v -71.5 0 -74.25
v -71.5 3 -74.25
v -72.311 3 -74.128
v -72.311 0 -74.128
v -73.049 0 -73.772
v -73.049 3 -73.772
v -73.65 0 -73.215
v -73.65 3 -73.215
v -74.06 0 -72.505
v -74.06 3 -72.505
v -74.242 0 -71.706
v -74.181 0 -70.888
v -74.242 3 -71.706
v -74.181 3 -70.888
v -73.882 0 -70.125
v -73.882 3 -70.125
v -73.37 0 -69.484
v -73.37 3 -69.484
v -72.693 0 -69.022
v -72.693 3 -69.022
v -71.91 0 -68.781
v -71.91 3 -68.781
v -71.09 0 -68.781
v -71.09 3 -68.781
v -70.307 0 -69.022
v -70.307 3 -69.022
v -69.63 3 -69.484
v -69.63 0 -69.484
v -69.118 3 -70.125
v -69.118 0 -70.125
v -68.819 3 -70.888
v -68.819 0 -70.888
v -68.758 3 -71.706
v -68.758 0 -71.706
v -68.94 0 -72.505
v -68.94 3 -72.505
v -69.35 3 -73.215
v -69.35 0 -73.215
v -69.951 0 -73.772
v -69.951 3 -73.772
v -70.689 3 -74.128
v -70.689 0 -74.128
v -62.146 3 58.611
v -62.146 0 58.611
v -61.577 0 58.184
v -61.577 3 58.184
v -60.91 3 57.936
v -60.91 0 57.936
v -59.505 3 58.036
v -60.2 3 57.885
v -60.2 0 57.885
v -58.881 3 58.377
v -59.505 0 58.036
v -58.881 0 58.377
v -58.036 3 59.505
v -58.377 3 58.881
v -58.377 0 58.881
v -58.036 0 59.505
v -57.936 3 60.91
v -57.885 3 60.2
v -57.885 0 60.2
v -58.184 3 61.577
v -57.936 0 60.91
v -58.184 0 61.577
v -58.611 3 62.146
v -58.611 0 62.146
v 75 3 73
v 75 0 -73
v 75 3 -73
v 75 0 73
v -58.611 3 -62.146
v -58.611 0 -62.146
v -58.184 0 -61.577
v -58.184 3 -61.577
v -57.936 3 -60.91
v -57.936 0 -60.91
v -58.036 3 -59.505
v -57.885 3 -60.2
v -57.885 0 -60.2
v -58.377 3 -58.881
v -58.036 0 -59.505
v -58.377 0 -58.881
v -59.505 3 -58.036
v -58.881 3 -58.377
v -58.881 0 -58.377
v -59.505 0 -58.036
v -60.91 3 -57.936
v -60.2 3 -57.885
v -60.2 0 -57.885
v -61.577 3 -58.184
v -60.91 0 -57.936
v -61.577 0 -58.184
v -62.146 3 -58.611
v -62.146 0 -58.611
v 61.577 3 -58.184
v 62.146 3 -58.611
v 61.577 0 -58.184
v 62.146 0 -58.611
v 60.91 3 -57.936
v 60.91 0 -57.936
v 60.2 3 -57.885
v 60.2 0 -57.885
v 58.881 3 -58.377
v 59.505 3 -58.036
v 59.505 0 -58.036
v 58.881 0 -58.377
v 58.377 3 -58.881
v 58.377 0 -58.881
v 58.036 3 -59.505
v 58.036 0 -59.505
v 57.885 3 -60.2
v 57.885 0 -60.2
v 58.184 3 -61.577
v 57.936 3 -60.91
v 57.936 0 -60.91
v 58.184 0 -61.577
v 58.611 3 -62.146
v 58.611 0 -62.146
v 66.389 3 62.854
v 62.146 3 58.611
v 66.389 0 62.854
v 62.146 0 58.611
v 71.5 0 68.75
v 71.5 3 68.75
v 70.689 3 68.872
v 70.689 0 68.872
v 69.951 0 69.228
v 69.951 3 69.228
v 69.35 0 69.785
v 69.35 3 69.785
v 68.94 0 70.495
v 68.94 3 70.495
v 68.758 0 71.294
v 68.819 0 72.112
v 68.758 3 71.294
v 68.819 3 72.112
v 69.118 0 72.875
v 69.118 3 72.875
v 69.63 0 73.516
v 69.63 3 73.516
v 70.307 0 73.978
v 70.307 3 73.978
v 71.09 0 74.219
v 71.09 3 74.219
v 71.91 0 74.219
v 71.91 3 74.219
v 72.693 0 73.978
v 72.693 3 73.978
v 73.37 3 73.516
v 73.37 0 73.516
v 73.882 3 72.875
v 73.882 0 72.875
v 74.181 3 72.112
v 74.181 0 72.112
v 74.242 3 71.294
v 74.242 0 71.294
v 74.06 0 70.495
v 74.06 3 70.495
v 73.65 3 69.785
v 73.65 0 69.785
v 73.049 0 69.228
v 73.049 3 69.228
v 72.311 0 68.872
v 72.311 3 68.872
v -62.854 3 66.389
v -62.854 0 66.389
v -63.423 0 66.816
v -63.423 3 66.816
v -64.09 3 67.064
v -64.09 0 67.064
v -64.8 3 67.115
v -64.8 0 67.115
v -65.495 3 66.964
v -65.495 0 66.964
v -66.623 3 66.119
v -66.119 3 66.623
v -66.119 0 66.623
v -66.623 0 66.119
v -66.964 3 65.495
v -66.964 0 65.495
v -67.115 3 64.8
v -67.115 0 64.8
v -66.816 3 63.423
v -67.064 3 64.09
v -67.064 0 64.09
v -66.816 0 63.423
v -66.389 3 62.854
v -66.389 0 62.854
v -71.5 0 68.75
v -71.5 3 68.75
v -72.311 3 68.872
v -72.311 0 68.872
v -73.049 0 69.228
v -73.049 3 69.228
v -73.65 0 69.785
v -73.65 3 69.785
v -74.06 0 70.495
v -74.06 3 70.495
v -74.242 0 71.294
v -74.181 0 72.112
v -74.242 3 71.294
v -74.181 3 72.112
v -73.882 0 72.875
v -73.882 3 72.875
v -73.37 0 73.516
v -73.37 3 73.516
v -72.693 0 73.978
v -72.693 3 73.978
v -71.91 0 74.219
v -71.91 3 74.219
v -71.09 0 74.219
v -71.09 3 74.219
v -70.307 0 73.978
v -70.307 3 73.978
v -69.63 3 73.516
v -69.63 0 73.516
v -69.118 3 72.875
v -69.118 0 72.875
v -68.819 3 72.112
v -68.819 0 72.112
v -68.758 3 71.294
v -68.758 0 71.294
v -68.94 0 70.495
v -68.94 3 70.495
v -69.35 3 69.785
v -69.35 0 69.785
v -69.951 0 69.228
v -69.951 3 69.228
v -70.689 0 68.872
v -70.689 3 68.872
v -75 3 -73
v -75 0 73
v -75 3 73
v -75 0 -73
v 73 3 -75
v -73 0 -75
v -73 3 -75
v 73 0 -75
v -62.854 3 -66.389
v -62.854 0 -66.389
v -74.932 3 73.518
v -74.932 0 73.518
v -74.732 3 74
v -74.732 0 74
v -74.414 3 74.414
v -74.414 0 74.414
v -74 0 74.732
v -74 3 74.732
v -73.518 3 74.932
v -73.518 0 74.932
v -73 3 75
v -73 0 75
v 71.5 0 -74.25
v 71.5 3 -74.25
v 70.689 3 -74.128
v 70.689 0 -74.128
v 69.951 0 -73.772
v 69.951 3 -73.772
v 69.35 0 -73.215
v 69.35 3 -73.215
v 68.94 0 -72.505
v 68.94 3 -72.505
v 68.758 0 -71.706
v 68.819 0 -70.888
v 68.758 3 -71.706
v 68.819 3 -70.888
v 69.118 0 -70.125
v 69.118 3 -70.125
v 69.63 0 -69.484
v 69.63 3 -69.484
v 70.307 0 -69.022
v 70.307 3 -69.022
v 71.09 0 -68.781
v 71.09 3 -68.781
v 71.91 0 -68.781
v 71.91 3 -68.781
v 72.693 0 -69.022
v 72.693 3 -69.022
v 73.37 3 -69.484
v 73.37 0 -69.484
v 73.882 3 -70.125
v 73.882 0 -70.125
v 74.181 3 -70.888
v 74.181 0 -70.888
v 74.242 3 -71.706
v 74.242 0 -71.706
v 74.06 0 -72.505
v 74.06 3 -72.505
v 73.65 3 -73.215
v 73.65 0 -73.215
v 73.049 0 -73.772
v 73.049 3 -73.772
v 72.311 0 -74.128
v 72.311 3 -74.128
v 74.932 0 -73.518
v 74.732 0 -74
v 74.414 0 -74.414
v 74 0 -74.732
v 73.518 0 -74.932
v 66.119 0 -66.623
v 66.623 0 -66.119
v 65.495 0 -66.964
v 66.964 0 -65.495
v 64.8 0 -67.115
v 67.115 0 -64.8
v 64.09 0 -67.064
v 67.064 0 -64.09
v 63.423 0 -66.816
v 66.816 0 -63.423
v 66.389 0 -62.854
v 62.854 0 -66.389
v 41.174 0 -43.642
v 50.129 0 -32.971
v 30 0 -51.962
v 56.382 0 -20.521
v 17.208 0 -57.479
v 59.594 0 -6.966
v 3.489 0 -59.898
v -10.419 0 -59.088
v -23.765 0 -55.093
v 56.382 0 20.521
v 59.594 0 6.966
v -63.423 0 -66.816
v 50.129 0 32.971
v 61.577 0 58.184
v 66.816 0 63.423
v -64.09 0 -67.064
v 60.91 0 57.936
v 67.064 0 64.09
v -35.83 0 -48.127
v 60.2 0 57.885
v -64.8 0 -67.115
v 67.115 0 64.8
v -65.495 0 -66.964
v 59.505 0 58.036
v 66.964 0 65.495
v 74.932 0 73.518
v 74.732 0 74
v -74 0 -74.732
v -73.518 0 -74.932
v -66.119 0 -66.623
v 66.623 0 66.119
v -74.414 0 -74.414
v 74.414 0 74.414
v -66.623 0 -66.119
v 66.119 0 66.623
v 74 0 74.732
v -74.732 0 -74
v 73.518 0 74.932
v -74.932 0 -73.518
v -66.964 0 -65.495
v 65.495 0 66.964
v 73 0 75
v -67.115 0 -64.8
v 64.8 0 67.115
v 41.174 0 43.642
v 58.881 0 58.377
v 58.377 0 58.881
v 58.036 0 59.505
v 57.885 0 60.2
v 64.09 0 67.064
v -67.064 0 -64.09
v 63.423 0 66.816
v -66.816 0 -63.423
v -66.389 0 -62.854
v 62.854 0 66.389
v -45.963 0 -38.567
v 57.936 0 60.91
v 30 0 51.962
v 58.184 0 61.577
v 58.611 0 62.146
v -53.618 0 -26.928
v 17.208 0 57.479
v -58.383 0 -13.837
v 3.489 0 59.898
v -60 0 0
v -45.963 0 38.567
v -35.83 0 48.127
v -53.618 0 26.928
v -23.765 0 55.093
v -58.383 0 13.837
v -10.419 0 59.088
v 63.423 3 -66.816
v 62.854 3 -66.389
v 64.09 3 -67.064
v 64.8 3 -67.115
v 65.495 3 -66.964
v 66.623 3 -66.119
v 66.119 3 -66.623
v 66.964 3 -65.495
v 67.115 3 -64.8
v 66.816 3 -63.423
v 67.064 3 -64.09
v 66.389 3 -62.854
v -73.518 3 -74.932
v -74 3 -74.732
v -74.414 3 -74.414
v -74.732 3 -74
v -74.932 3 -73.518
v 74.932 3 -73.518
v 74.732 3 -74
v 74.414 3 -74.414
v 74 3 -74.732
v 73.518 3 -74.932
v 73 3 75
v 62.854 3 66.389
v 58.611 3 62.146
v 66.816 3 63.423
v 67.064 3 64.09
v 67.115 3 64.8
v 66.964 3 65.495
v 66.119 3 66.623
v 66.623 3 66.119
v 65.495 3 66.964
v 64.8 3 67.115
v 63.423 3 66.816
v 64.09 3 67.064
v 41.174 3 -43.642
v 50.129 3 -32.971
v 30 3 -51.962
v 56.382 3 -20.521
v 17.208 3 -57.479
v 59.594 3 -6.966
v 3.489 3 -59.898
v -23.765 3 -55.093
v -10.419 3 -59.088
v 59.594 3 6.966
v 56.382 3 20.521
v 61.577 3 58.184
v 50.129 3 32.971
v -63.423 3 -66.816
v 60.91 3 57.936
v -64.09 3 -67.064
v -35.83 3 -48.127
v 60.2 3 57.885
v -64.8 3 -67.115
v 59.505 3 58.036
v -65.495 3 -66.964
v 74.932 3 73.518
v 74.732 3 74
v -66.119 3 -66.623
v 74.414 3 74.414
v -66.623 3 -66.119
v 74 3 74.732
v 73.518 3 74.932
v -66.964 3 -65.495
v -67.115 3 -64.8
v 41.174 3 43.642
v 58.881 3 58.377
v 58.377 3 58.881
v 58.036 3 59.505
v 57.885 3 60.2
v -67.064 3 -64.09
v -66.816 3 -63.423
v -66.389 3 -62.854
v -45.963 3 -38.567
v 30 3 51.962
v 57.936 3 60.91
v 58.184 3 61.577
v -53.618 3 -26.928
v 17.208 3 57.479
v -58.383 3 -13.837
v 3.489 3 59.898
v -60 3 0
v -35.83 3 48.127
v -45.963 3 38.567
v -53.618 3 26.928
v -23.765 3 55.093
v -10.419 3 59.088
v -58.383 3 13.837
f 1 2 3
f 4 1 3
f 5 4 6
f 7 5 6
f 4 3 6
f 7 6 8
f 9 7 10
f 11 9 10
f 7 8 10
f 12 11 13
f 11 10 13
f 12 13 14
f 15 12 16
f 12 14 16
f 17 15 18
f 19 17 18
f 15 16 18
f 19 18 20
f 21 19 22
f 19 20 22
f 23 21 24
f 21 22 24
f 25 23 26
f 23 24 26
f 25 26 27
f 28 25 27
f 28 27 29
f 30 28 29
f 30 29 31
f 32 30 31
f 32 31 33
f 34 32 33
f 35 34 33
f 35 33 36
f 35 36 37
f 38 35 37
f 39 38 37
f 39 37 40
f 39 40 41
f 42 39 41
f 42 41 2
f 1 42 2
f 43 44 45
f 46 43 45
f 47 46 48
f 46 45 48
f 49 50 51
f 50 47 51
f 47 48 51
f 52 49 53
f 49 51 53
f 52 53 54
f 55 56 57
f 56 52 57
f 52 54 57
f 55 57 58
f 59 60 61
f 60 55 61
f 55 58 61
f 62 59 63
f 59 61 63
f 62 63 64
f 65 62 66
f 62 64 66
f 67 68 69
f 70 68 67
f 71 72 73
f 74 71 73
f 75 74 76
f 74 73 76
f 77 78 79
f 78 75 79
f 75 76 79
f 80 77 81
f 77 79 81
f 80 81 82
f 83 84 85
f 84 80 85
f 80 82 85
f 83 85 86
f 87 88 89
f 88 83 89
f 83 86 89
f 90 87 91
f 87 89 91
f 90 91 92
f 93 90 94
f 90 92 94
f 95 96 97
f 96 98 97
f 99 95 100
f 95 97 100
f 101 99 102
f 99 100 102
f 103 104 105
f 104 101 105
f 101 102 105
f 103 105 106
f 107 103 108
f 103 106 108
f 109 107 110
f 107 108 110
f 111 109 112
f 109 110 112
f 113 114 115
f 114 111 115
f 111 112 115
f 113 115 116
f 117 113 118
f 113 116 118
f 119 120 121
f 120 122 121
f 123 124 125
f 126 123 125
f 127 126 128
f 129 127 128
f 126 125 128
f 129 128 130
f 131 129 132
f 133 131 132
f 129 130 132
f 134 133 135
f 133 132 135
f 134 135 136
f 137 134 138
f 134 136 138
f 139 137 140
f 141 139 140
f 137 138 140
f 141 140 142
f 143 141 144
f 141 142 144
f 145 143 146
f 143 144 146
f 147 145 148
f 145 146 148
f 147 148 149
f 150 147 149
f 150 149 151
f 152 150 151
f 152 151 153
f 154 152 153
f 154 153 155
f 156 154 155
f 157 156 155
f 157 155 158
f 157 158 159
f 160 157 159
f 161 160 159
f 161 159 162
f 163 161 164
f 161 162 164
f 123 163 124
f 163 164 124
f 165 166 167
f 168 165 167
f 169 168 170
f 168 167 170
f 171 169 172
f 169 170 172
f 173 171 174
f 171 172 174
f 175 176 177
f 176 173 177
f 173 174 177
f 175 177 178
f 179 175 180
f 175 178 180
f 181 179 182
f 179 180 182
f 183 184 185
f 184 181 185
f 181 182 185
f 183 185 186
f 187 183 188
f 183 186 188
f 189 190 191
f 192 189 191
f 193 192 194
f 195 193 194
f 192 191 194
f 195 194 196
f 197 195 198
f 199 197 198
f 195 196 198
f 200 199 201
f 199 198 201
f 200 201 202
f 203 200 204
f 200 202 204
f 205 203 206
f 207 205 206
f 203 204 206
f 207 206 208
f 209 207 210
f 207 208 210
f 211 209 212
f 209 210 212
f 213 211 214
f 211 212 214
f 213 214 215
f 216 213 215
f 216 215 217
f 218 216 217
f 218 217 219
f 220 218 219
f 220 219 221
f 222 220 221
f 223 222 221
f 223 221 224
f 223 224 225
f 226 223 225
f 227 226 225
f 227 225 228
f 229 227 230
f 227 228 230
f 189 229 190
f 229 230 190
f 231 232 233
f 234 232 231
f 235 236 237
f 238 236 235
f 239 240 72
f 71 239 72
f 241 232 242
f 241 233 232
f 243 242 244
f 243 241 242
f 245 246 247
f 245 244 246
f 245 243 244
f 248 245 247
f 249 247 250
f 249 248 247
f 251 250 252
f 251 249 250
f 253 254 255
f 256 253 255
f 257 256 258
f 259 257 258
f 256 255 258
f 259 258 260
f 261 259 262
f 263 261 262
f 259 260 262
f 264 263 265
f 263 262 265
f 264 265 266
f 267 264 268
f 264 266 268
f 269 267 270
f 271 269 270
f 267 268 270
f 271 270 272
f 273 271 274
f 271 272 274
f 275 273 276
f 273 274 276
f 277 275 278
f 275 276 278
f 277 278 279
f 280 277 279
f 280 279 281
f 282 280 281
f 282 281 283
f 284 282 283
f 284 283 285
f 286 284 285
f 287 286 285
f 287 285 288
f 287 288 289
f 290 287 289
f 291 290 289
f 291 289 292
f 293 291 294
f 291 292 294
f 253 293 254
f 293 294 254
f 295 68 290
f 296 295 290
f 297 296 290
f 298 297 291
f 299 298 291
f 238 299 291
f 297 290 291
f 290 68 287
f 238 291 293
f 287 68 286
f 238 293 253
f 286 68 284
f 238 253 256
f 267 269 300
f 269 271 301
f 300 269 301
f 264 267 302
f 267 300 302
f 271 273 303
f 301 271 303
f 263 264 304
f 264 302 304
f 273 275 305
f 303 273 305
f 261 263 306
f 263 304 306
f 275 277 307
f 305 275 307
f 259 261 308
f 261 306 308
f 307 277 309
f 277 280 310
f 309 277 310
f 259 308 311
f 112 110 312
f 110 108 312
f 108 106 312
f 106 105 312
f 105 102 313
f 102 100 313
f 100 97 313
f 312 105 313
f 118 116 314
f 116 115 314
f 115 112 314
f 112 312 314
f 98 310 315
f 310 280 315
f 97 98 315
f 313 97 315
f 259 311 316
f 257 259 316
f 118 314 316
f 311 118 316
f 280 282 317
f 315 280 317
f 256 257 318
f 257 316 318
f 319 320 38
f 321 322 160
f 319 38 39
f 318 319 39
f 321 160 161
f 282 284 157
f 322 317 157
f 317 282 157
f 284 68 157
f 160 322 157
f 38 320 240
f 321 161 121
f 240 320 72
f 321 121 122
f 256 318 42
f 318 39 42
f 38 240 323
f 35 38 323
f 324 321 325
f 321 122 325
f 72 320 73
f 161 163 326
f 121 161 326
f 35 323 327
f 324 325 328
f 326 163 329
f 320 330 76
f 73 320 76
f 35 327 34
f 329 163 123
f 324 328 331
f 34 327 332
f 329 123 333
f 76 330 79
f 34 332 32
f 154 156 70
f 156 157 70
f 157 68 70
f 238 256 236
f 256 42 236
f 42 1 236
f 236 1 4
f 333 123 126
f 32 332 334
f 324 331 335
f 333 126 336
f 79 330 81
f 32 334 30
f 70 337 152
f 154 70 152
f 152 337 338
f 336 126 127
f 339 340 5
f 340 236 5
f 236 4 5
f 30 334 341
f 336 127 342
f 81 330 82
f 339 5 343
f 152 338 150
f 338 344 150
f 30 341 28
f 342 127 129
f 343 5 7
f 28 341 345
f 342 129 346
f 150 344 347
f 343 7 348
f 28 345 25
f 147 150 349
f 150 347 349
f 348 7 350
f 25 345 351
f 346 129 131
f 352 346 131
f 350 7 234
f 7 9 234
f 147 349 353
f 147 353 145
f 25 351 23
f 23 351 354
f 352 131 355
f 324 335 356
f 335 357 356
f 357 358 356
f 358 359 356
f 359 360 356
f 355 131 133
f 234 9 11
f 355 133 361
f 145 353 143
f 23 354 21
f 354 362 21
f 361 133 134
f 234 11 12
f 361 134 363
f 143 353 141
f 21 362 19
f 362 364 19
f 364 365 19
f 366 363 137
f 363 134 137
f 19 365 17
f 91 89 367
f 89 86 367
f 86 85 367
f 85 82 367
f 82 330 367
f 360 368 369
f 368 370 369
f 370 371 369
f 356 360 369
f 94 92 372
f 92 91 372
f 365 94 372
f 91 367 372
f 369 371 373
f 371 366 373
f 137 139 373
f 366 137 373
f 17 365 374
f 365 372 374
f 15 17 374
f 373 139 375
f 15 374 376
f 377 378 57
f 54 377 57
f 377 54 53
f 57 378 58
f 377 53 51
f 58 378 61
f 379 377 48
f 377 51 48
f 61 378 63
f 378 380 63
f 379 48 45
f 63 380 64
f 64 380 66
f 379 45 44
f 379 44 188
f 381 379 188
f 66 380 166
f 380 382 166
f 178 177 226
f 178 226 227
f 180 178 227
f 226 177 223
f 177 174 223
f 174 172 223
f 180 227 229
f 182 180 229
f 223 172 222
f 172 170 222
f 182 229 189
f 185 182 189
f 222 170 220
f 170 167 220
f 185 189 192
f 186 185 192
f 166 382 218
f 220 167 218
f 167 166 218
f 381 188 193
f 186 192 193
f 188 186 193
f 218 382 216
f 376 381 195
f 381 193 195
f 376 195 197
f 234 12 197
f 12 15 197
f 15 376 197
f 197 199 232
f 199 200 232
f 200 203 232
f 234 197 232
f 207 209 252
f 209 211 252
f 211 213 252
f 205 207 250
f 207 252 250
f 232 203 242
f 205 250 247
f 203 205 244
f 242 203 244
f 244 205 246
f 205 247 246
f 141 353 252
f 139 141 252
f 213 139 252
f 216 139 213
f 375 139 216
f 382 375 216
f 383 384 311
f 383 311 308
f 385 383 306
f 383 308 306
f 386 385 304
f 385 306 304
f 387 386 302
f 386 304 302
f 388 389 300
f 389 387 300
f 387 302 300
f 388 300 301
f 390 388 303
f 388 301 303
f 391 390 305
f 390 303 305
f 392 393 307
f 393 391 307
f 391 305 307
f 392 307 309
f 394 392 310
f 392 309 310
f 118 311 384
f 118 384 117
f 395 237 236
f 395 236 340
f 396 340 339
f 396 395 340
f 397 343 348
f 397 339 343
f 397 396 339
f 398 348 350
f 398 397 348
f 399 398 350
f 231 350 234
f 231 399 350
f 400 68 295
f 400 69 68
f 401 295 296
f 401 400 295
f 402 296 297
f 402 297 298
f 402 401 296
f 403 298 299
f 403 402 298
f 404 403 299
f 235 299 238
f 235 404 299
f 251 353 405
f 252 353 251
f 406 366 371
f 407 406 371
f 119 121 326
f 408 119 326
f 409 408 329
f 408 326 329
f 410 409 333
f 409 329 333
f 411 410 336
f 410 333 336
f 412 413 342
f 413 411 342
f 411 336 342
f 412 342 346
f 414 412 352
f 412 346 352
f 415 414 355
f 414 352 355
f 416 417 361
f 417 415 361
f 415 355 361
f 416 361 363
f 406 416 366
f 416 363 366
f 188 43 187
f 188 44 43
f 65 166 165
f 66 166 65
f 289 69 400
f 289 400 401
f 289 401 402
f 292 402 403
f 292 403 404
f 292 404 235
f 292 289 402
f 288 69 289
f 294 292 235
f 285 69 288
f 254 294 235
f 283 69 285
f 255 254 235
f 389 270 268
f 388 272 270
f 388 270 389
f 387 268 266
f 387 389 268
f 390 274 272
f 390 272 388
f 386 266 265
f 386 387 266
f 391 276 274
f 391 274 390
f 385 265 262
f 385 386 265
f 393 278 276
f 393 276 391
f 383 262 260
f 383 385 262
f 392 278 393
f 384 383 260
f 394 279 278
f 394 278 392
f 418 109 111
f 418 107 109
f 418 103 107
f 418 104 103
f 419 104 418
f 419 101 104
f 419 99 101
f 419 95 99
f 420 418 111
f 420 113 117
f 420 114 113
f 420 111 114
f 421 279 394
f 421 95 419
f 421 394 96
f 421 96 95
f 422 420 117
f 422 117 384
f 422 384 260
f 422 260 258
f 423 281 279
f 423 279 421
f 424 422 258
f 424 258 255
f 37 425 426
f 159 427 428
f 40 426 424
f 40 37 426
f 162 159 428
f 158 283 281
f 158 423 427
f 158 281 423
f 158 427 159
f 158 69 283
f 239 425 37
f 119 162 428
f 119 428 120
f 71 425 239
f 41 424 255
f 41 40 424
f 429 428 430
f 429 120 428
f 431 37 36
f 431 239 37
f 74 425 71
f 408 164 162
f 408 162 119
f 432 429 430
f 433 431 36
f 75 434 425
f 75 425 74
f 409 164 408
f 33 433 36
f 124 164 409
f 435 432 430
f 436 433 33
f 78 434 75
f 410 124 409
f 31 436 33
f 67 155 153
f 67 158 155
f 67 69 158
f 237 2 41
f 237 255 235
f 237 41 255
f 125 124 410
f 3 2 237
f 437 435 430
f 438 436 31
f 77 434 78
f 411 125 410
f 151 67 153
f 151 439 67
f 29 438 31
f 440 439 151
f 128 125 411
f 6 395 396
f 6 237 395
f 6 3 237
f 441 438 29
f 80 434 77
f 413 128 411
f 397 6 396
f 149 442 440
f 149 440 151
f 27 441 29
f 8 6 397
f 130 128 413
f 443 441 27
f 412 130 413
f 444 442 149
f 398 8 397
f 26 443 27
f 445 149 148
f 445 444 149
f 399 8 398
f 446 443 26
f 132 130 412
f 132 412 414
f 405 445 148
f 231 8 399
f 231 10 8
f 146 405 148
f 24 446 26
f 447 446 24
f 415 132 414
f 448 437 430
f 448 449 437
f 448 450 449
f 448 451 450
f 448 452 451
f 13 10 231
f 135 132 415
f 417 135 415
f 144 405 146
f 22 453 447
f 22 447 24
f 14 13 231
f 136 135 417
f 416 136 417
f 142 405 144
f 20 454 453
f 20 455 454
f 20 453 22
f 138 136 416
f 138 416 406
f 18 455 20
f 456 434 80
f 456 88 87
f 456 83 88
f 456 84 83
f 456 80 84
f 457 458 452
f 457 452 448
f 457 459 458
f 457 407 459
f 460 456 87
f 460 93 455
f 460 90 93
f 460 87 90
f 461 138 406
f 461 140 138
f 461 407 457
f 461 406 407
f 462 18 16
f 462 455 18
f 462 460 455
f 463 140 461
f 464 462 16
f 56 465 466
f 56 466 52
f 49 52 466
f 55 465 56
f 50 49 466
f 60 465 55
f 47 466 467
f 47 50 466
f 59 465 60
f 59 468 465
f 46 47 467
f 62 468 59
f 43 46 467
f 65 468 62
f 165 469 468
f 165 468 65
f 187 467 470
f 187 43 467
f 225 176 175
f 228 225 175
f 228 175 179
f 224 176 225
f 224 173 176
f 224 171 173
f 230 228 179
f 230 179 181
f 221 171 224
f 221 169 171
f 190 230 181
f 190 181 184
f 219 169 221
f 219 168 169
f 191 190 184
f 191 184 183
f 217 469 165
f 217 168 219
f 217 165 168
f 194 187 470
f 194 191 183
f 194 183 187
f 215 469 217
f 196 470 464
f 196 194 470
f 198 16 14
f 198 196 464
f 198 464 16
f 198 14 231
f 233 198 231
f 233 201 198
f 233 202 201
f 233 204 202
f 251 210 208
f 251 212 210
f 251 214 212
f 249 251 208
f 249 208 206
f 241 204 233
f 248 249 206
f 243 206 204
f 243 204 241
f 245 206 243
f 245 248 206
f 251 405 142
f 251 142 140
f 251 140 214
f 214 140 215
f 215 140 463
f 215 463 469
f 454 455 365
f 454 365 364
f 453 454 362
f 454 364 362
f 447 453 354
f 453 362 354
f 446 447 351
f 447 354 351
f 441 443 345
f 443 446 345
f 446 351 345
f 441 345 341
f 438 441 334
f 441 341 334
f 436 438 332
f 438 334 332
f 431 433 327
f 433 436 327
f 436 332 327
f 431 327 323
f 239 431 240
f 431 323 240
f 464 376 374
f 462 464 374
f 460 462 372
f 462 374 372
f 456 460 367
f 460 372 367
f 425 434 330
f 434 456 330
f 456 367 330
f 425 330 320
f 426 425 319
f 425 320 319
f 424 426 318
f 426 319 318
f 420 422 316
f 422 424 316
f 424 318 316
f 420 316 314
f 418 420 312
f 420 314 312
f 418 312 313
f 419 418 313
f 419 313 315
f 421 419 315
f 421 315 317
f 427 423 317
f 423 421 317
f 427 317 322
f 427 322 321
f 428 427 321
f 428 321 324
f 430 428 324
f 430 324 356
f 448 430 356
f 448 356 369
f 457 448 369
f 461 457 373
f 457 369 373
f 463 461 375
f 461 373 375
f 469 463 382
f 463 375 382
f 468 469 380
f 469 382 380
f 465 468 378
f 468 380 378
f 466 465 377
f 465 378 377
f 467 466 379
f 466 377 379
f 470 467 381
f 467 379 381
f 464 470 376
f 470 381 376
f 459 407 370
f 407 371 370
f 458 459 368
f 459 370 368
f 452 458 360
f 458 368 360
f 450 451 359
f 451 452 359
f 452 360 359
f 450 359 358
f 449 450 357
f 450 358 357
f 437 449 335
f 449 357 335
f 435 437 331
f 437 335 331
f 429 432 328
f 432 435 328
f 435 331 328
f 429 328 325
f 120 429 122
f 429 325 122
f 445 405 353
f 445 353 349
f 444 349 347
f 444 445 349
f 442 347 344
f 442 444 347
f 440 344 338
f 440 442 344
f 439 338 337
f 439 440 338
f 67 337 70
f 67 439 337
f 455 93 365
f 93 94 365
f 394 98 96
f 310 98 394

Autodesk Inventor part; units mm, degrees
ref_plane "YZ Plane" through (0, 0, 0) normal (1, 0, 0) x (0, 1, 0)
ref_plane "XZ Plane" through (0, 0, 0) normal (0, 1, 0) x (-1, 0, 0)
ref_plane "XY Plane" through (0, 0, 0) normal (0, 0, 1) x (1, 0, 0)
sketch "Sketch1" plane through (0, 0, 0) normal (0, 1, 0) x (-1, 0, 0)
  line L0 (-75, 75) -> (75, 75)
  line L1 (75, 75) -> (75, -75)
  line L2 (75, -75) -> (-75, -75)
  line L3 (-75, -75) -> (-75, 75)
  line L4 (-75, 75) -> (75, -75) construction
  line L5 (75, 75) -> (-75, -75) construction
  circle A0 centre (0, 0) radius 60
  line L6 (-62.5, 62.5) -> (62.5, 62.5) construction
  line L7 (62.5, 62.5) -> (62.5, -62.5) construction
  line L8 (62.5, -62.5) -> (-62.5, -62.5) construction
  line L9 (-62.5, -62.5) -> (-62.5, 62.5) construction
  line L10 (-62.5, 62.5) -> (62.5, -62.5) construction
  line L11 (62.5, 62.5) -> (-62.5, -62.5) construction
  circle A1 centre (62.5, 62.5) radius 2.5
  circle A2 centre (62.5, -62.5) radius 2.5
  circle A3 centre (-62.5, 62.5) radius 2.5
  circle A4 centre (-62.5, -62.5) radius 2.5
  line L12 (64.6213, -64.6213) -> (60.3787, -60.3787) construction
  line L13 (62.8536, -66.3891) -> (58.6109, -62.1464)
  line L14 (62.1464, -58.6109) -> (66.3891, -62.8536)
  arc A5 (62.8536, -66.3891) -> (66.3891, -62.8536) centre (64.6213, -64.6213) ccw
  arc A6 (62.1464, -58.6109) -> (58.6109, -62.1464) centre (60.3787, -60.3787) ccw
  line L15 (-64.6213, -64.6213) -> (-60.3787, -60.3787) construction
  line L16 (-62.8536, -66.3891) -> (-58.6109, -62.1464)
  line L17 (-62.1464, -58.6109) -> (-66.3891, -62.8536)
  arc A7 (-66.3891, -62.8536) -> (-62.8536, -66.3891) centre (-64.6213, -64.6213) ccw
  arc A8 (-58.6109, -62.1464) -> (-62.1464, -58.6109) centre (-60.3787, -60.3787) ccw
  line L18 (-64.6213, 64.6213) -> (-60.3787, 60.3787) construction
  line L19 (-62.8536, 66.3891) -> (-58.6109, 62.1464)
  line L20 (-62.1464, 58.6109) -> (-66.3891, 62.8536)
  arc A9 (-62.8536, 66.3891) -> (-66.3891, 62.8536) centre (-64.6213, 64.6213) ccw
  arc A10 (-62.1464, 58.6109) -> (-58.6109, 62.1464) centre (-60.3787, 60.3787) ccw
  line L21 (64.6213, 64.6213) -> (60.3787, 60.3787) construction
  line L22 (62.8536, 66.3891) -> (58.6109, 62.1464)
  line L23 (62.1464, 58.6109) -> (66.3891, 62.8536)
  arc A11 (66.3891, 62.8536) -> (62.8536, 66.3891) centre (64.6213, 64.6213) ccw
  arc A12 (58.6109, 62.1464) -> (62.1464, 58.6109) centre (60.3787, 60.3787) ccw
  dimension "d0" = 150
  dimension "d1" = 150
  dimension "d2" = 120
  dimension "d3" = 125
  dimension "d4" = 5
  dimension "d5" = 5
  dimension "d6" = 5
  dimension "d7" = 5
  dimension "d21" = 3
  dimension "d22" = 3
  dimension "d23" = 3
  dimension "d24" = 3
extrude "Extrusion1" add sketch "Sketch1" along normal blind 3
sketch "Sketch2" plane through (0, 0, 0) normal (0, -1, 0) x (1, 0, 0)
  line L0 (-71.5, -71.5) -> (71.5, -71.5)
  line L1 (71.5, -71.5) -> (71.5, 71.5)
  line L2 (71.5, 71.5) -> (-71.5, 71.5)
  line L3 (-71.5, 71.5) -> (-71.5, -71.5)
  line L4 (-71.5, -71.5) -> (71.5, 71.5) construction
  line L5 (71.5, -71.5) -> (-71.5, 71.5) construction
  point P0 (0, 0)
  dimension "d11" = 143
  dimension "d19" = 143
hole "Hole1" at (-71.5, 0, 71.5) at (71.5, 0, 71.5) at (71.5, 0, -71.5) at (-71.5, 0, -71.5) direction (0, 1, 0) diameter 5.5 depth 6 tip angle 118
fillet "Fillet2" radius 2 4 edges at (-75, 1.5, 75) (75, 1.5, 75) (-75, 1.5, -75) (75, 1.5, -75)
equation "\"d8\" = d24"
properties part number "150mm_Bearing_Plate" material "Aluminum 6061"
